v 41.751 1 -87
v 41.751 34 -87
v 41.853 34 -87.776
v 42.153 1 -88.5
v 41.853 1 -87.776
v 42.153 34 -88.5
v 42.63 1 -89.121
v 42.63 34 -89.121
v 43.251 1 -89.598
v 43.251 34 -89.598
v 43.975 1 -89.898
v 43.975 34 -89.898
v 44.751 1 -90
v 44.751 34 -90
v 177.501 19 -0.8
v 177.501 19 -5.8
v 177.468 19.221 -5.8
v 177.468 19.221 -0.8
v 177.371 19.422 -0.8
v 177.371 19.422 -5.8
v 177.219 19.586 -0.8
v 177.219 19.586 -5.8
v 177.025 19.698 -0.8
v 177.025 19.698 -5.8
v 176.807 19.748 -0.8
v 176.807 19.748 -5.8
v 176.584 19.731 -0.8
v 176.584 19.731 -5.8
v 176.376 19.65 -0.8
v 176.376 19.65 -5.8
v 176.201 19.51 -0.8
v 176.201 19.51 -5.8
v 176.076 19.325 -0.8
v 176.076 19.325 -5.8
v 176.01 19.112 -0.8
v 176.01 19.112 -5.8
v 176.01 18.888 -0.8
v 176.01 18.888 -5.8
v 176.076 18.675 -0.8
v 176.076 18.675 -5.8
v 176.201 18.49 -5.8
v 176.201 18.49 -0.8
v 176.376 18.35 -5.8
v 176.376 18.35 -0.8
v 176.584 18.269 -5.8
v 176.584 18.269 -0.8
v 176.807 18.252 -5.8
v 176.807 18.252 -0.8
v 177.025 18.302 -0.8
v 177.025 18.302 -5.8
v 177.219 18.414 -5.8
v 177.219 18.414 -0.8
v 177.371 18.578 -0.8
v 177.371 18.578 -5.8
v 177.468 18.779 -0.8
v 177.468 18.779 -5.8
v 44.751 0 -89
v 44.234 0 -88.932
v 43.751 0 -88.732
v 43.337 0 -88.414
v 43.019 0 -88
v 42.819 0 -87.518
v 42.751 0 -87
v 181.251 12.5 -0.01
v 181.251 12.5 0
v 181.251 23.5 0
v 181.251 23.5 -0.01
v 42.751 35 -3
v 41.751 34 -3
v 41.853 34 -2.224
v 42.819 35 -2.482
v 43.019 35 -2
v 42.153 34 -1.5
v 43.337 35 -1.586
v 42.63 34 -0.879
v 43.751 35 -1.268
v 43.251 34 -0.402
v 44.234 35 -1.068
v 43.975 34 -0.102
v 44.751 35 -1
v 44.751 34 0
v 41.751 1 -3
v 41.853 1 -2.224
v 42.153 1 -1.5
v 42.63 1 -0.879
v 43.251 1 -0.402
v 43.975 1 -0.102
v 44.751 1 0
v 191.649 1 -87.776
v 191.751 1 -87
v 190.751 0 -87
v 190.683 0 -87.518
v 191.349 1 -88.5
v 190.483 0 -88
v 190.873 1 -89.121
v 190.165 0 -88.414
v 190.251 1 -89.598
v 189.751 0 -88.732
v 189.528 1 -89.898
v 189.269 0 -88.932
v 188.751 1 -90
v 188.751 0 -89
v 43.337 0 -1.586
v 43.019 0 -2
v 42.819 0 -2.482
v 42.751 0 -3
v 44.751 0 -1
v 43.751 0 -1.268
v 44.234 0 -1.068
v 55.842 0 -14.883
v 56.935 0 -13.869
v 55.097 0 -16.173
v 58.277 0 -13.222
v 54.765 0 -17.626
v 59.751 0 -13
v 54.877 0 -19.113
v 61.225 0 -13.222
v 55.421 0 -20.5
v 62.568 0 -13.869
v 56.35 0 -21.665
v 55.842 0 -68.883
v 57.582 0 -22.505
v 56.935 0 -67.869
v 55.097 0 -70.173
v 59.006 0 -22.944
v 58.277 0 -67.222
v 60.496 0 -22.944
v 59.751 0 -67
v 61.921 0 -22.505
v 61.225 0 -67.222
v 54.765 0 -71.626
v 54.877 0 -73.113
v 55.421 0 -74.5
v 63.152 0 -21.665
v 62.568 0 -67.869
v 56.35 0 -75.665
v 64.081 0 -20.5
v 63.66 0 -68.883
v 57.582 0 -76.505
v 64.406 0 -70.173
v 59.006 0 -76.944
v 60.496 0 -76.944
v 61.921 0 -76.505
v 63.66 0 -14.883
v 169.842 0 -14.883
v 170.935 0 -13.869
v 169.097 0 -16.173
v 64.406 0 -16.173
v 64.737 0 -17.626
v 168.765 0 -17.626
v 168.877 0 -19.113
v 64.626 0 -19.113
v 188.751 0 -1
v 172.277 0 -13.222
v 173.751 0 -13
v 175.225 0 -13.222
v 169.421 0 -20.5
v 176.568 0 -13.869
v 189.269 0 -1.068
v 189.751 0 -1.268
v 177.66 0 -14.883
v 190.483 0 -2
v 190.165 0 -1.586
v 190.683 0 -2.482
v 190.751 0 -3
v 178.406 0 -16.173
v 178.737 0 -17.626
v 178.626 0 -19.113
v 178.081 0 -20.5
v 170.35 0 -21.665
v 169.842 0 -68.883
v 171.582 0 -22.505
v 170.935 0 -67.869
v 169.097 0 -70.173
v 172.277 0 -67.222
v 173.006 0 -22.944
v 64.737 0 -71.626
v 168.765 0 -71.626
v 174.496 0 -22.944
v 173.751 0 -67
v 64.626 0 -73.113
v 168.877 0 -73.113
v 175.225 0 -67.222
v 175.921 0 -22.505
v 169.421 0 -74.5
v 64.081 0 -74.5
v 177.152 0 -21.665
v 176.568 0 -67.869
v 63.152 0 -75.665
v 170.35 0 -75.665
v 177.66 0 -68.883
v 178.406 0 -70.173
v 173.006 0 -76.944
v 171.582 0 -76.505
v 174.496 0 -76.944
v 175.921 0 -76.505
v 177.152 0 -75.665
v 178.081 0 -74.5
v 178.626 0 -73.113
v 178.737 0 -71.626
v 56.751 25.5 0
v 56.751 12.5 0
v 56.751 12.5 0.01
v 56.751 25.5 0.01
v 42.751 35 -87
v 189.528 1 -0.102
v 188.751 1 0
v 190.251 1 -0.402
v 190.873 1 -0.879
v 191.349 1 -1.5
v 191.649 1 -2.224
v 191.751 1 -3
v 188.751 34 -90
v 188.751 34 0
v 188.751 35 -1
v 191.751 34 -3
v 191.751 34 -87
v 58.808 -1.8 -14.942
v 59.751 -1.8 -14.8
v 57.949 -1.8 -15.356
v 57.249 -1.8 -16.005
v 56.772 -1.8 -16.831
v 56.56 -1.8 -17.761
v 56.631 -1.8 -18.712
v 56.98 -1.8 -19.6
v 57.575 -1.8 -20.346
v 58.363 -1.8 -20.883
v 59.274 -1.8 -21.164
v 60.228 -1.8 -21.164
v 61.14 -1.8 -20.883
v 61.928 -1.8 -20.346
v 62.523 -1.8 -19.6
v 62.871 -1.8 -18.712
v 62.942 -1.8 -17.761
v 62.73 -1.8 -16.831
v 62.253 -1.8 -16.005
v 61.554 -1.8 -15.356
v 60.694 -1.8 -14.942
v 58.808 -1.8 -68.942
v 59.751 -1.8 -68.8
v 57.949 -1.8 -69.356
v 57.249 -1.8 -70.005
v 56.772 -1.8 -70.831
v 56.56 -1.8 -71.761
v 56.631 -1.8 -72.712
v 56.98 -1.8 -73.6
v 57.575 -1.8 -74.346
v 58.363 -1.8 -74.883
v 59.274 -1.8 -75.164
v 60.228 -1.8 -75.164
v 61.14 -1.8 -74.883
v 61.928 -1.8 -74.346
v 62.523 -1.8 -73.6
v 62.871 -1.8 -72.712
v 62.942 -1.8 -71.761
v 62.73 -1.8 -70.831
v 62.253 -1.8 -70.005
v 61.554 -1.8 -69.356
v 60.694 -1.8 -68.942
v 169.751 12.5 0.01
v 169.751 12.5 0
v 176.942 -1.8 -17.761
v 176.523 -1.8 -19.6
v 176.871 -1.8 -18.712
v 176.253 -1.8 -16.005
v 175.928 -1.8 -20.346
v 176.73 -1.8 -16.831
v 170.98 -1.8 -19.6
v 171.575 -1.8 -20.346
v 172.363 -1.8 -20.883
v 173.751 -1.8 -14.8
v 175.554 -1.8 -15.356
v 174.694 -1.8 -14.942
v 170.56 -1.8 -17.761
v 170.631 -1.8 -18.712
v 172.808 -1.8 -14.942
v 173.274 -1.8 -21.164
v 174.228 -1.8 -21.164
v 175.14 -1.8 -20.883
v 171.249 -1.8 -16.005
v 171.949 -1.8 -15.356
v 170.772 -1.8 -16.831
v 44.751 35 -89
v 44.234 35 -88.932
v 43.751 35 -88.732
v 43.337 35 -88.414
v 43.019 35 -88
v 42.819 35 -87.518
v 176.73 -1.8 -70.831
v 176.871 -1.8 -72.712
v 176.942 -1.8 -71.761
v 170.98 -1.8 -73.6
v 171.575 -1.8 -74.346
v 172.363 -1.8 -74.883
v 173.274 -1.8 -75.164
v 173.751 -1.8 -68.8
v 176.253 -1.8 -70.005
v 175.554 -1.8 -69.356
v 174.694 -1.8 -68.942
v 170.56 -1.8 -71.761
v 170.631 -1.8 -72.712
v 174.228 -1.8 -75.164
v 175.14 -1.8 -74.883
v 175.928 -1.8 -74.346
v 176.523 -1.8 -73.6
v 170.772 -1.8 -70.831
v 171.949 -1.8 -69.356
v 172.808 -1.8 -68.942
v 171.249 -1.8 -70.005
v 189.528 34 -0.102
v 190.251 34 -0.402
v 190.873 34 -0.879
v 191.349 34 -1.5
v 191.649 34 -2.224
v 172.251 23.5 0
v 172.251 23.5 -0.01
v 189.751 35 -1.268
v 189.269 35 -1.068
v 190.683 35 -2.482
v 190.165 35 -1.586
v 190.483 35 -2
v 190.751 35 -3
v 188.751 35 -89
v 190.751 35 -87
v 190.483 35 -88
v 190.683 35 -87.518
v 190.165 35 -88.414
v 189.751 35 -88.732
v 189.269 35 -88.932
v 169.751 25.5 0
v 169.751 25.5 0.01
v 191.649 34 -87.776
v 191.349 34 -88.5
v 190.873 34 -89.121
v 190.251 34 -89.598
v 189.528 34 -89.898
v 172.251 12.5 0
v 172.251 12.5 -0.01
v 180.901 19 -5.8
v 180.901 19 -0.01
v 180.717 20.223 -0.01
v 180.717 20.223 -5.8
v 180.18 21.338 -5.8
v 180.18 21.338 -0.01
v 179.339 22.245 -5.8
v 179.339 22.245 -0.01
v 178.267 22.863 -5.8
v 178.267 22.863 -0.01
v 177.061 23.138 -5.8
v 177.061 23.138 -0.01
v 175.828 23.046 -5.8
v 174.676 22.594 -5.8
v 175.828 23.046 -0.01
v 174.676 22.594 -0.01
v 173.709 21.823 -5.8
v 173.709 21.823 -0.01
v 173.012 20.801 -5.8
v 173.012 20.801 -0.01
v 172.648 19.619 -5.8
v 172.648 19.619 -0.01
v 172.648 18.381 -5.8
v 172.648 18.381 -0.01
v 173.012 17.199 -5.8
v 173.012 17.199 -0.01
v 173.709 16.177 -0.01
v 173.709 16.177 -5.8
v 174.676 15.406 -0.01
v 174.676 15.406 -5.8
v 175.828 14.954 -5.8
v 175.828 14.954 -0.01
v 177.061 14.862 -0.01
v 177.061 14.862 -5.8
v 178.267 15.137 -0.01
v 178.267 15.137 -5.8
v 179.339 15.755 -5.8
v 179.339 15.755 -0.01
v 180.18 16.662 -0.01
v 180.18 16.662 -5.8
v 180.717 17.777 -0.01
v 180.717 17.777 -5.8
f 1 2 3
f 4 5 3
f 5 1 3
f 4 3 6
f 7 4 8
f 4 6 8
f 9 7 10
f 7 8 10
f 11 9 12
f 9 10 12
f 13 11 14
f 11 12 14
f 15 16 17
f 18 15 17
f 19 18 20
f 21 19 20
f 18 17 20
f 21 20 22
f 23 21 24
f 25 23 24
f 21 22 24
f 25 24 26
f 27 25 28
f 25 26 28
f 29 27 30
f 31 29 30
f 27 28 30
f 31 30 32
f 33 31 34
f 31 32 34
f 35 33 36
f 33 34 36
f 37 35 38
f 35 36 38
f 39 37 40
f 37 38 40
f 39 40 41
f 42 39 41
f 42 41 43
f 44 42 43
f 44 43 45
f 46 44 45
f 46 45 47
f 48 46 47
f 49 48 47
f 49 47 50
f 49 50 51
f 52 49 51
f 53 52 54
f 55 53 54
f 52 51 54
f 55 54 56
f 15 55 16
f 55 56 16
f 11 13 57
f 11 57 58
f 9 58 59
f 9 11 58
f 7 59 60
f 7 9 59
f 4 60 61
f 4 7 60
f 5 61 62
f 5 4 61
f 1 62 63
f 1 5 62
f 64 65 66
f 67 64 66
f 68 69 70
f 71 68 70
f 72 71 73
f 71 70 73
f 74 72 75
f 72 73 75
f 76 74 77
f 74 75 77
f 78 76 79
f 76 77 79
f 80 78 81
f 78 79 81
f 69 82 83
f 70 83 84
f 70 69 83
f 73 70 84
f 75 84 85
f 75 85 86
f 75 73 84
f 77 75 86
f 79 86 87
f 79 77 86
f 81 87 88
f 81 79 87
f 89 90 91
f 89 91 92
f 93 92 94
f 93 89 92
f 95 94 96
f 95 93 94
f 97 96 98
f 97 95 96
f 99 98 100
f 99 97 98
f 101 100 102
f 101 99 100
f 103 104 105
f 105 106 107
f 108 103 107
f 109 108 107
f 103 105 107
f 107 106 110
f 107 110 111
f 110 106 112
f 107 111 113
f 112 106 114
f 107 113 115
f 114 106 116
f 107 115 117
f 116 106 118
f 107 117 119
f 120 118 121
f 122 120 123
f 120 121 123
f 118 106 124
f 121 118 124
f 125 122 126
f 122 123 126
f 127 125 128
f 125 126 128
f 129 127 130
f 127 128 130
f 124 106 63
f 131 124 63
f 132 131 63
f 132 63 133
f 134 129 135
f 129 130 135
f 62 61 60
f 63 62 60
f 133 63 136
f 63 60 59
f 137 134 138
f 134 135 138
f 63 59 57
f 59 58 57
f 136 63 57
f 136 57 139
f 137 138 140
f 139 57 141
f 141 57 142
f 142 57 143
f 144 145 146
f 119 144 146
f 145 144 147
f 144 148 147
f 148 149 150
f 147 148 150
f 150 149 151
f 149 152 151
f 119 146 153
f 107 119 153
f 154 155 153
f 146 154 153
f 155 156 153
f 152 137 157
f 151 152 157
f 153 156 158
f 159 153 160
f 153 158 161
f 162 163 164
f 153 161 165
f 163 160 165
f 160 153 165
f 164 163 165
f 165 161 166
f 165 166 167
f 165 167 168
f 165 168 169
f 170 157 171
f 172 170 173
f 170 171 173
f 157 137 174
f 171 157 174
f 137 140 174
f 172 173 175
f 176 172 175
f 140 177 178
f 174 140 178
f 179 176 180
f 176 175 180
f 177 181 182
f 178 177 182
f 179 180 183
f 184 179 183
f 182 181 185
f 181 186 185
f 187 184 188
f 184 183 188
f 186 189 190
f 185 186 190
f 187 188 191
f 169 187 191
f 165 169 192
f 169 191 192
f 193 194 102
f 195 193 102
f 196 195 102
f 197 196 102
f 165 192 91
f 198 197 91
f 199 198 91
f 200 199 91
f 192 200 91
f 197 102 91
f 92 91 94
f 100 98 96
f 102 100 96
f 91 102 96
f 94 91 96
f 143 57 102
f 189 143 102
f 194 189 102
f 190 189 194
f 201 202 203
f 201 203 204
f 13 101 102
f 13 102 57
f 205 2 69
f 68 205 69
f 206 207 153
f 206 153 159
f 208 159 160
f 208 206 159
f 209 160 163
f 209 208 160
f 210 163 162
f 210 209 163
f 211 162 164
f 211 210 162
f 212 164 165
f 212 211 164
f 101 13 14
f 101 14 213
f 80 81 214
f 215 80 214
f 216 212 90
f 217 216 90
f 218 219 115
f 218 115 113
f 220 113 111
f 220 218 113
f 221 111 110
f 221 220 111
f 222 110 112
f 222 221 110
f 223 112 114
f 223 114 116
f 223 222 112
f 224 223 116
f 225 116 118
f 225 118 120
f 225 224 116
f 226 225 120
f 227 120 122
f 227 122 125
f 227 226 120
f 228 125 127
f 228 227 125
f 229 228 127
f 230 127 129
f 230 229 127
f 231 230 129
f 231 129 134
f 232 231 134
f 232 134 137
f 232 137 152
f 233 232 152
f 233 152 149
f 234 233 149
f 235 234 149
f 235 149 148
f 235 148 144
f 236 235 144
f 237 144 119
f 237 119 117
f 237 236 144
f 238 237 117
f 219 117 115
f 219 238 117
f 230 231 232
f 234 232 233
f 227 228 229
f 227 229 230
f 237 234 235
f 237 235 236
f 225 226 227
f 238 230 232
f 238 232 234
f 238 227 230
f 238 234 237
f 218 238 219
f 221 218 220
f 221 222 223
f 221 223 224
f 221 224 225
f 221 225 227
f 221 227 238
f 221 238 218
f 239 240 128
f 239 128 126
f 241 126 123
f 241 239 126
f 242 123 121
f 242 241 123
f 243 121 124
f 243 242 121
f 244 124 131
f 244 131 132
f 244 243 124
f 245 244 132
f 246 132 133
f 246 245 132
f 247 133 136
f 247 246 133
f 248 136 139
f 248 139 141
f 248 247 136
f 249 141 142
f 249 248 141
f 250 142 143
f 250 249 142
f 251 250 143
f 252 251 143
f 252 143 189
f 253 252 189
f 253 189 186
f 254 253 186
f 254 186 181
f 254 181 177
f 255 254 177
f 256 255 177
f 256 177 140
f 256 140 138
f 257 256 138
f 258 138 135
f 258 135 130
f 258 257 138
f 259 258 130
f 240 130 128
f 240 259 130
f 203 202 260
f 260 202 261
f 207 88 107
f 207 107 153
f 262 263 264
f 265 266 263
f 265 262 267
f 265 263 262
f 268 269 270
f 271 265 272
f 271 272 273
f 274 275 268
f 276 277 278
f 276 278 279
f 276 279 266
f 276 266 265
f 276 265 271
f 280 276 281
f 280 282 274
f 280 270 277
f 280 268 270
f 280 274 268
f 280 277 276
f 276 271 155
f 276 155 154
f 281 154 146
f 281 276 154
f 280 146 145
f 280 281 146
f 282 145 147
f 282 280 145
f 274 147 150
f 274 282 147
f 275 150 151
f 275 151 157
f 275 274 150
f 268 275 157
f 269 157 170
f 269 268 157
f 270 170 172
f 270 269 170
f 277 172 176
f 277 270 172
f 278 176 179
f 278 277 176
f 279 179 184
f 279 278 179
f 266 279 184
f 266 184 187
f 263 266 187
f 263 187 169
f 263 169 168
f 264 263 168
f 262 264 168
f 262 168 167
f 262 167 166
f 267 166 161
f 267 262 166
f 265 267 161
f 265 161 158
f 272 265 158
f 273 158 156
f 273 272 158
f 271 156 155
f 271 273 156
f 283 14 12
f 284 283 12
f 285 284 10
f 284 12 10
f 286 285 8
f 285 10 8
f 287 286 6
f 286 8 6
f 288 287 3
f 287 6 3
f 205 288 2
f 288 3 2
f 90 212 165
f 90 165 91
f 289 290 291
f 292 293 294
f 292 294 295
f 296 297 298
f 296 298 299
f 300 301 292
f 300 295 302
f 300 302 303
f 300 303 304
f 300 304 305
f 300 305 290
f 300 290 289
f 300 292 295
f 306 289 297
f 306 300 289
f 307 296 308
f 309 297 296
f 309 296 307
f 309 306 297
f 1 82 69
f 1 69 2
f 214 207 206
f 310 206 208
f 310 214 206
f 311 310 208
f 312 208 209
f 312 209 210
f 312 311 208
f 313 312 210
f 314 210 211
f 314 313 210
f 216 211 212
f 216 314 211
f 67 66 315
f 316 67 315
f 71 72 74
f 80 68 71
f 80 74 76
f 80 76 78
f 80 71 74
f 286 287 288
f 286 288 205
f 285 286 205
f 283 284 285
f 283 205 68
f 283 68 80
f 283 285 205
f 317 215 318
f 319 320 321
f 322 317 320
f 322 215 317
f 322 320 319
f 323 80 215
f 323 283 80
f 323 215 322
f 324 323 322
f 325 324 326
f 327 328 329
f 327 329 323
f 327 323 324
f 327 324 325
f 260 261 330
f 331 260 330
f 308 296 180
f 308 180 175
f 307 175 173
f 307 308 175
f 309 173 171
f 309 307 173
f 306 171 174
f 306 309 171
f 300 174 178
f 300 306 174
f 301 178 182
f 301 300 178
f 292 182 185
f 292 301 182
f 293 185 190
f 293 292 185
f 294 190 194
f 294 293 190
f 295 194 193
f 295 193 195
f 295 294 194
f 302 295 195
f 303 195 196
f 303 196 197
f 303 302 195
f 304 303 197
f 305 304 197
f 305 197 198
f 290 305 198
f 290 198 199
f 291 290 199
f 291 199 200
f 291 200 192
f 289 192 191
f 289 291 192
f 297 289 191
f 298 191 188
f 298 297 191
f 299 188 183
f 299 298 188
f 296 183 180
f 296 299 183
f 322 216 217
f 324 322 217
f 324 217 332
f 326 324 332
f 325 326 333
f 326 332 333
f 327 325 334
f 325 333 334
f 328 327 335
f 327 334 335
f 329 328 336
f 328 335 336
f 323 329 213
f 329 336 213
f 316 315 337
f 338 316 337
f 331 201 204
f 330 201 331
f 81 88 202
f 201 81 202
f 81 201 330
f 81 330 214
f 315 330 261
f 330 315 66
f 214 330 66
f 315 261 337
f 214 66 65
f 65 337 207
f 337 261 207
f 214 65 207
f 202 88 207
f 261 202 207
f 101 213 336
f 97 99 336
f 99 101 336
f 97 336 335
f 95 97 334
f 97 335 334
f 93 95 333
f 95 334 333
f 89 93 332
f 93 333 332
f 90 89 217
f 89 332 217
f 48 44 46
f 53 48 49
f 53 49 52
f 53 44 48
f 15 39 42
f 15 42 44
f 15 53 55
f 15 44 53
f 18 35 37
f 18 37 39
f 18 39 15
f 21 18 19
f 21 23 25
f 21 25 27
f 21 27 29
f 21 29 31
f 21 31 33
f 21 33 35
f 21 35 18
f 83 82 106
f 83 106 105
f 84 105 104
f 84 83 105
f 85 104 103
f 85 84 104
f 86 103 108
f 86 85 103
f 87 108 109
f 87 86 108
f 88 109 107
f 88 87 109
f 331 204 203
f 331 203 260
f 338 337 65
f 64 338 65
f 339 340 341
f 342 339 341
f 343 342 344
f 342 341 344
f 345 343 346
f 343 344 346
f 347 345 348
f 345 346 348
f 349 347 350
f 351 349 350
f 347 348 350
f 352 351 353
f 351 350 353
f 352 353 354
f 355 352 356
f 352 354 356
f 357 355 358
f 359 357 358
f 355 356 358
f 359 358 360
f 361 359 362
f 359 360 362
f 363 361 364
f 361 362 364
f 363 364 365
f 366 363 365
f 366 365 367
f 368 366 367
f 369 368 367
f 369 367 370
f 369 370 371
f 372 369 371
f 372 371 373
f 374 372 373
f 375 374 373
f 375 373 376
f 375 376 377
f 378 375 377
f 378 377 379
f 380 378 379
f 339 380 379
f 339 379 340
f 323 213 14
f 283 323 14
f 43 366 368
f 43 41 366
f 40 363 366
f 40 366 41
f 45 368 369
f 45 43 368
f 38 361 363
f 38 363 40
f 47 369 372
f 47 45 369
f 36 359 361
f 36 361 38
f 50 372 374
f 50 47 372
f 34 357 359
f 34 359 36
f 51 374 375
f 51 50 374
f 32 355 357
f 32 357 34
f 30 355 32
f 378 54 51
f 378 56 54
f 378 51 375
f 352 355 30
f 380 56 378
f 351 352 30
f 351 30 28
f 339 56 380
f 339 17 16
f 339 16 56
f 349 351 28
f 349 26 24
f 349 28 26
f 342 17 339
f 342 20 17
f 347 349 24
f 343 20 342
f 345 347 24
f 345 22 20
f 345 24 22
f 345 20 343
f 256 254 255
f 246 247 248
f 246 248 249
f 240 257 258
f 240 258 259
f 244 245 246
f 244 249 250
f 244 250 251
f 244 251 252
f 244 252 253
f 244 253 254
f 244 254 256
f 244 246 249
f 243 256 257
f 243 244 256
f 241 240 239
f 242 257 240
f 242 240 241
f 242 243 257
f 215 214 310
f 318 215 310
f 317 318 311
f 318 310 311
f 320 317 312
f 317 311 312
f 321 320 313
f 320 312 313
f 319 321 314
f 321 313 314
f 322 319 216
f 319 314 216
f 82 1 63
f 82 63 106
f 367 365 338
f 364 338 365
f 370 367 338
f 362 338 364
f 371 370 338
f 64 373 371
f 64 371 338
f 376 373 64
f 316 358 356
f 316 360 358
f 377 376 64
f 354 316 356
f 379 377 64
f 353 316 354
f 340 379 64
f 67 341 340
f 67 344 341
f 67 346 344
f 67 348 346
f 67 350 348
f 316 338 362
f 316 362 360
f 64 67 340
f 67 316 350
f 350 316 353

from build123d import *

# Parameters (mm, degrees)
SKETCH_1_W          = 150
SKETCH_1_H          = 90
EXTRUDE_1_DEPTH     = 35
SKETCH_2_R          = 5
EXTRUDE_2_DEPTH     = 1.8
FILLET_1_R          = 3
CHAMFER_1_SIZE      = 1
CHAMFER_2_SIZE      = 1.8
SKETCH_3_R          = 4.15
CUT_EXTRUDE_1_DEPTH = 5.8
SKETCH_4_R          = 0.75
EXTRUDE_3_DEPTH     = 5
CUT_EXTRUDE_2_DEPTH = 0.01
SKETCH_6_W          = 113
SKETCH_6_H          = 13
EXTRUDE_4_DEPTH     = 0.01


with BuildPart() as part:
    # 草图1 → 凸台-拉伸1 (new body)
    with BuildSketch(Plane(origin=(0, 0, 0), x_dir=(1, 0, 0), z_dir=(0, 1, 0))):
        with Locations((116.751230923, 45)):
            Rectangle(SKETCH_1_W, SKETCH_1_H)
    extrude(amount=EXTRUDE_1_DEPTH)

    # 草图2 → 凸台-拉伸2 (add)
    with BuildSketch(Plane.XZ):
        with Locations(Location((173.751230923, -18, 0), (0, 0, 90))):
            Circle(SKETCH_2_R)
        with Locations(Location((59.751230923, -18, 0), (0, 0, 90))):
            Circle(SKETCH_2_R)
        with Locations(Location((59.751230923, -72, 0), (0, 0, 90))):
            Circle(SKETCH_2_R)
        with Locations(Location((173.751230923, -72, 0), (0, 0, 90))):
            Circle(SKETCH_2_R)
    extrude(amount=EXTRUDE_2_DEPTH)

    # 圆角1
    fillet_1_edges = [part.edges().sort_by_distance(p)[0] for p in [
        (41.751230923, 17.5, -90),
        (191.751230923, 17.5, -90),
        (191.751230923, 17.5, 0),
        (41.751230923, 17.5, 0),
    ]]
    fillet(fillet_1_edges, radius=FILLET_1_R)

    # 倒角1
    chamfer_1_edges = [part.edges().sort_by_distance(p)[0] for p in [
        (191.751230923, 0, -45),
        (191.751230923, 35, -45),
        (41.751230923, 0, -45),
        (116.751230923, 0, -90),
        (116.751230923, 0, 0),
        (42.629910579, 0, -89.121320344),
        (42.629910579, 0, -0.878679656),
        (190.872551266, 0, -89.121320344),
        (190.872551266, 0, -0.878679656),
        (116.751230923, 35, 0),
        (41.751230923, 35, -45),
        (116.751230923, 35, -90),
        (42.629910579, 35, -89.121320344),
        (42.629910579, 35, -0.878679656),
        (190.872551266, 35, -89.121320344),
        (190.872551266, 35, -0.878679656),
    ]]
    chamfer(chamfer_1_edges, length=CHAMFER_1_SIZE)

    # 倒角2
    chamfer_2_edges = [part.edges().sort_by_distance(p)[0] for p in [
        (173.751230923, -1.8, -23),
        (59.751230923, -1.8, -23),
        (59.751230923, -1.8, -77),
        (173.751230923, -1.8, -77),
    ]]
    chamfer(chamfer_2_edges, length=CHAMFER_2_SIZE - 0.0001)  # a hair under: the kernel refuses the full size

    # 草图3 → 切除-拉伸1 (cut)
    with BuildSketch(Plane.XY):
        with Locations((176.751230923, 19)):
            Circle(SKETCH_3_R)
    extrude(amount=-CUT_EXTRUDE_1_DEPTH, mode=Mode.SUBTRACT)

    # 草图4 → 凸台-拉伸3 (add)
    with BuildSketch(Plane.XY.offset(-5.8)):
        with Locations((176.751230923, 19)):
            Circle(SKETCH_4_R)
    extrude(amount=EXTRUDE_3_DEPTH)

    # 草图5 → 切除-拉伸2 (cut)
    with BuildSketch(Plane.XY):
        Polygon((176.751230923, 23.5), (172.251230923, 23.5), (172.251230923, 12.5), (181.251230923, 12.5), (181.251230923, 23.5), align=None)
    extrude(amount=-CUT_EXTRUDE_2_DEPTH, mode=Mode.SUBTRACT)

    # 草图6 → 凸台-拉伸4 (add)
    with BuildSketch(Plane.XY):
        with Locations((113.251230923, 19)):
            Rectangle(SKETCH_6_W, SKETCH_6_H)
    extrude(amount=EXTRUDE_4_DEPTH)


solid = part.part
